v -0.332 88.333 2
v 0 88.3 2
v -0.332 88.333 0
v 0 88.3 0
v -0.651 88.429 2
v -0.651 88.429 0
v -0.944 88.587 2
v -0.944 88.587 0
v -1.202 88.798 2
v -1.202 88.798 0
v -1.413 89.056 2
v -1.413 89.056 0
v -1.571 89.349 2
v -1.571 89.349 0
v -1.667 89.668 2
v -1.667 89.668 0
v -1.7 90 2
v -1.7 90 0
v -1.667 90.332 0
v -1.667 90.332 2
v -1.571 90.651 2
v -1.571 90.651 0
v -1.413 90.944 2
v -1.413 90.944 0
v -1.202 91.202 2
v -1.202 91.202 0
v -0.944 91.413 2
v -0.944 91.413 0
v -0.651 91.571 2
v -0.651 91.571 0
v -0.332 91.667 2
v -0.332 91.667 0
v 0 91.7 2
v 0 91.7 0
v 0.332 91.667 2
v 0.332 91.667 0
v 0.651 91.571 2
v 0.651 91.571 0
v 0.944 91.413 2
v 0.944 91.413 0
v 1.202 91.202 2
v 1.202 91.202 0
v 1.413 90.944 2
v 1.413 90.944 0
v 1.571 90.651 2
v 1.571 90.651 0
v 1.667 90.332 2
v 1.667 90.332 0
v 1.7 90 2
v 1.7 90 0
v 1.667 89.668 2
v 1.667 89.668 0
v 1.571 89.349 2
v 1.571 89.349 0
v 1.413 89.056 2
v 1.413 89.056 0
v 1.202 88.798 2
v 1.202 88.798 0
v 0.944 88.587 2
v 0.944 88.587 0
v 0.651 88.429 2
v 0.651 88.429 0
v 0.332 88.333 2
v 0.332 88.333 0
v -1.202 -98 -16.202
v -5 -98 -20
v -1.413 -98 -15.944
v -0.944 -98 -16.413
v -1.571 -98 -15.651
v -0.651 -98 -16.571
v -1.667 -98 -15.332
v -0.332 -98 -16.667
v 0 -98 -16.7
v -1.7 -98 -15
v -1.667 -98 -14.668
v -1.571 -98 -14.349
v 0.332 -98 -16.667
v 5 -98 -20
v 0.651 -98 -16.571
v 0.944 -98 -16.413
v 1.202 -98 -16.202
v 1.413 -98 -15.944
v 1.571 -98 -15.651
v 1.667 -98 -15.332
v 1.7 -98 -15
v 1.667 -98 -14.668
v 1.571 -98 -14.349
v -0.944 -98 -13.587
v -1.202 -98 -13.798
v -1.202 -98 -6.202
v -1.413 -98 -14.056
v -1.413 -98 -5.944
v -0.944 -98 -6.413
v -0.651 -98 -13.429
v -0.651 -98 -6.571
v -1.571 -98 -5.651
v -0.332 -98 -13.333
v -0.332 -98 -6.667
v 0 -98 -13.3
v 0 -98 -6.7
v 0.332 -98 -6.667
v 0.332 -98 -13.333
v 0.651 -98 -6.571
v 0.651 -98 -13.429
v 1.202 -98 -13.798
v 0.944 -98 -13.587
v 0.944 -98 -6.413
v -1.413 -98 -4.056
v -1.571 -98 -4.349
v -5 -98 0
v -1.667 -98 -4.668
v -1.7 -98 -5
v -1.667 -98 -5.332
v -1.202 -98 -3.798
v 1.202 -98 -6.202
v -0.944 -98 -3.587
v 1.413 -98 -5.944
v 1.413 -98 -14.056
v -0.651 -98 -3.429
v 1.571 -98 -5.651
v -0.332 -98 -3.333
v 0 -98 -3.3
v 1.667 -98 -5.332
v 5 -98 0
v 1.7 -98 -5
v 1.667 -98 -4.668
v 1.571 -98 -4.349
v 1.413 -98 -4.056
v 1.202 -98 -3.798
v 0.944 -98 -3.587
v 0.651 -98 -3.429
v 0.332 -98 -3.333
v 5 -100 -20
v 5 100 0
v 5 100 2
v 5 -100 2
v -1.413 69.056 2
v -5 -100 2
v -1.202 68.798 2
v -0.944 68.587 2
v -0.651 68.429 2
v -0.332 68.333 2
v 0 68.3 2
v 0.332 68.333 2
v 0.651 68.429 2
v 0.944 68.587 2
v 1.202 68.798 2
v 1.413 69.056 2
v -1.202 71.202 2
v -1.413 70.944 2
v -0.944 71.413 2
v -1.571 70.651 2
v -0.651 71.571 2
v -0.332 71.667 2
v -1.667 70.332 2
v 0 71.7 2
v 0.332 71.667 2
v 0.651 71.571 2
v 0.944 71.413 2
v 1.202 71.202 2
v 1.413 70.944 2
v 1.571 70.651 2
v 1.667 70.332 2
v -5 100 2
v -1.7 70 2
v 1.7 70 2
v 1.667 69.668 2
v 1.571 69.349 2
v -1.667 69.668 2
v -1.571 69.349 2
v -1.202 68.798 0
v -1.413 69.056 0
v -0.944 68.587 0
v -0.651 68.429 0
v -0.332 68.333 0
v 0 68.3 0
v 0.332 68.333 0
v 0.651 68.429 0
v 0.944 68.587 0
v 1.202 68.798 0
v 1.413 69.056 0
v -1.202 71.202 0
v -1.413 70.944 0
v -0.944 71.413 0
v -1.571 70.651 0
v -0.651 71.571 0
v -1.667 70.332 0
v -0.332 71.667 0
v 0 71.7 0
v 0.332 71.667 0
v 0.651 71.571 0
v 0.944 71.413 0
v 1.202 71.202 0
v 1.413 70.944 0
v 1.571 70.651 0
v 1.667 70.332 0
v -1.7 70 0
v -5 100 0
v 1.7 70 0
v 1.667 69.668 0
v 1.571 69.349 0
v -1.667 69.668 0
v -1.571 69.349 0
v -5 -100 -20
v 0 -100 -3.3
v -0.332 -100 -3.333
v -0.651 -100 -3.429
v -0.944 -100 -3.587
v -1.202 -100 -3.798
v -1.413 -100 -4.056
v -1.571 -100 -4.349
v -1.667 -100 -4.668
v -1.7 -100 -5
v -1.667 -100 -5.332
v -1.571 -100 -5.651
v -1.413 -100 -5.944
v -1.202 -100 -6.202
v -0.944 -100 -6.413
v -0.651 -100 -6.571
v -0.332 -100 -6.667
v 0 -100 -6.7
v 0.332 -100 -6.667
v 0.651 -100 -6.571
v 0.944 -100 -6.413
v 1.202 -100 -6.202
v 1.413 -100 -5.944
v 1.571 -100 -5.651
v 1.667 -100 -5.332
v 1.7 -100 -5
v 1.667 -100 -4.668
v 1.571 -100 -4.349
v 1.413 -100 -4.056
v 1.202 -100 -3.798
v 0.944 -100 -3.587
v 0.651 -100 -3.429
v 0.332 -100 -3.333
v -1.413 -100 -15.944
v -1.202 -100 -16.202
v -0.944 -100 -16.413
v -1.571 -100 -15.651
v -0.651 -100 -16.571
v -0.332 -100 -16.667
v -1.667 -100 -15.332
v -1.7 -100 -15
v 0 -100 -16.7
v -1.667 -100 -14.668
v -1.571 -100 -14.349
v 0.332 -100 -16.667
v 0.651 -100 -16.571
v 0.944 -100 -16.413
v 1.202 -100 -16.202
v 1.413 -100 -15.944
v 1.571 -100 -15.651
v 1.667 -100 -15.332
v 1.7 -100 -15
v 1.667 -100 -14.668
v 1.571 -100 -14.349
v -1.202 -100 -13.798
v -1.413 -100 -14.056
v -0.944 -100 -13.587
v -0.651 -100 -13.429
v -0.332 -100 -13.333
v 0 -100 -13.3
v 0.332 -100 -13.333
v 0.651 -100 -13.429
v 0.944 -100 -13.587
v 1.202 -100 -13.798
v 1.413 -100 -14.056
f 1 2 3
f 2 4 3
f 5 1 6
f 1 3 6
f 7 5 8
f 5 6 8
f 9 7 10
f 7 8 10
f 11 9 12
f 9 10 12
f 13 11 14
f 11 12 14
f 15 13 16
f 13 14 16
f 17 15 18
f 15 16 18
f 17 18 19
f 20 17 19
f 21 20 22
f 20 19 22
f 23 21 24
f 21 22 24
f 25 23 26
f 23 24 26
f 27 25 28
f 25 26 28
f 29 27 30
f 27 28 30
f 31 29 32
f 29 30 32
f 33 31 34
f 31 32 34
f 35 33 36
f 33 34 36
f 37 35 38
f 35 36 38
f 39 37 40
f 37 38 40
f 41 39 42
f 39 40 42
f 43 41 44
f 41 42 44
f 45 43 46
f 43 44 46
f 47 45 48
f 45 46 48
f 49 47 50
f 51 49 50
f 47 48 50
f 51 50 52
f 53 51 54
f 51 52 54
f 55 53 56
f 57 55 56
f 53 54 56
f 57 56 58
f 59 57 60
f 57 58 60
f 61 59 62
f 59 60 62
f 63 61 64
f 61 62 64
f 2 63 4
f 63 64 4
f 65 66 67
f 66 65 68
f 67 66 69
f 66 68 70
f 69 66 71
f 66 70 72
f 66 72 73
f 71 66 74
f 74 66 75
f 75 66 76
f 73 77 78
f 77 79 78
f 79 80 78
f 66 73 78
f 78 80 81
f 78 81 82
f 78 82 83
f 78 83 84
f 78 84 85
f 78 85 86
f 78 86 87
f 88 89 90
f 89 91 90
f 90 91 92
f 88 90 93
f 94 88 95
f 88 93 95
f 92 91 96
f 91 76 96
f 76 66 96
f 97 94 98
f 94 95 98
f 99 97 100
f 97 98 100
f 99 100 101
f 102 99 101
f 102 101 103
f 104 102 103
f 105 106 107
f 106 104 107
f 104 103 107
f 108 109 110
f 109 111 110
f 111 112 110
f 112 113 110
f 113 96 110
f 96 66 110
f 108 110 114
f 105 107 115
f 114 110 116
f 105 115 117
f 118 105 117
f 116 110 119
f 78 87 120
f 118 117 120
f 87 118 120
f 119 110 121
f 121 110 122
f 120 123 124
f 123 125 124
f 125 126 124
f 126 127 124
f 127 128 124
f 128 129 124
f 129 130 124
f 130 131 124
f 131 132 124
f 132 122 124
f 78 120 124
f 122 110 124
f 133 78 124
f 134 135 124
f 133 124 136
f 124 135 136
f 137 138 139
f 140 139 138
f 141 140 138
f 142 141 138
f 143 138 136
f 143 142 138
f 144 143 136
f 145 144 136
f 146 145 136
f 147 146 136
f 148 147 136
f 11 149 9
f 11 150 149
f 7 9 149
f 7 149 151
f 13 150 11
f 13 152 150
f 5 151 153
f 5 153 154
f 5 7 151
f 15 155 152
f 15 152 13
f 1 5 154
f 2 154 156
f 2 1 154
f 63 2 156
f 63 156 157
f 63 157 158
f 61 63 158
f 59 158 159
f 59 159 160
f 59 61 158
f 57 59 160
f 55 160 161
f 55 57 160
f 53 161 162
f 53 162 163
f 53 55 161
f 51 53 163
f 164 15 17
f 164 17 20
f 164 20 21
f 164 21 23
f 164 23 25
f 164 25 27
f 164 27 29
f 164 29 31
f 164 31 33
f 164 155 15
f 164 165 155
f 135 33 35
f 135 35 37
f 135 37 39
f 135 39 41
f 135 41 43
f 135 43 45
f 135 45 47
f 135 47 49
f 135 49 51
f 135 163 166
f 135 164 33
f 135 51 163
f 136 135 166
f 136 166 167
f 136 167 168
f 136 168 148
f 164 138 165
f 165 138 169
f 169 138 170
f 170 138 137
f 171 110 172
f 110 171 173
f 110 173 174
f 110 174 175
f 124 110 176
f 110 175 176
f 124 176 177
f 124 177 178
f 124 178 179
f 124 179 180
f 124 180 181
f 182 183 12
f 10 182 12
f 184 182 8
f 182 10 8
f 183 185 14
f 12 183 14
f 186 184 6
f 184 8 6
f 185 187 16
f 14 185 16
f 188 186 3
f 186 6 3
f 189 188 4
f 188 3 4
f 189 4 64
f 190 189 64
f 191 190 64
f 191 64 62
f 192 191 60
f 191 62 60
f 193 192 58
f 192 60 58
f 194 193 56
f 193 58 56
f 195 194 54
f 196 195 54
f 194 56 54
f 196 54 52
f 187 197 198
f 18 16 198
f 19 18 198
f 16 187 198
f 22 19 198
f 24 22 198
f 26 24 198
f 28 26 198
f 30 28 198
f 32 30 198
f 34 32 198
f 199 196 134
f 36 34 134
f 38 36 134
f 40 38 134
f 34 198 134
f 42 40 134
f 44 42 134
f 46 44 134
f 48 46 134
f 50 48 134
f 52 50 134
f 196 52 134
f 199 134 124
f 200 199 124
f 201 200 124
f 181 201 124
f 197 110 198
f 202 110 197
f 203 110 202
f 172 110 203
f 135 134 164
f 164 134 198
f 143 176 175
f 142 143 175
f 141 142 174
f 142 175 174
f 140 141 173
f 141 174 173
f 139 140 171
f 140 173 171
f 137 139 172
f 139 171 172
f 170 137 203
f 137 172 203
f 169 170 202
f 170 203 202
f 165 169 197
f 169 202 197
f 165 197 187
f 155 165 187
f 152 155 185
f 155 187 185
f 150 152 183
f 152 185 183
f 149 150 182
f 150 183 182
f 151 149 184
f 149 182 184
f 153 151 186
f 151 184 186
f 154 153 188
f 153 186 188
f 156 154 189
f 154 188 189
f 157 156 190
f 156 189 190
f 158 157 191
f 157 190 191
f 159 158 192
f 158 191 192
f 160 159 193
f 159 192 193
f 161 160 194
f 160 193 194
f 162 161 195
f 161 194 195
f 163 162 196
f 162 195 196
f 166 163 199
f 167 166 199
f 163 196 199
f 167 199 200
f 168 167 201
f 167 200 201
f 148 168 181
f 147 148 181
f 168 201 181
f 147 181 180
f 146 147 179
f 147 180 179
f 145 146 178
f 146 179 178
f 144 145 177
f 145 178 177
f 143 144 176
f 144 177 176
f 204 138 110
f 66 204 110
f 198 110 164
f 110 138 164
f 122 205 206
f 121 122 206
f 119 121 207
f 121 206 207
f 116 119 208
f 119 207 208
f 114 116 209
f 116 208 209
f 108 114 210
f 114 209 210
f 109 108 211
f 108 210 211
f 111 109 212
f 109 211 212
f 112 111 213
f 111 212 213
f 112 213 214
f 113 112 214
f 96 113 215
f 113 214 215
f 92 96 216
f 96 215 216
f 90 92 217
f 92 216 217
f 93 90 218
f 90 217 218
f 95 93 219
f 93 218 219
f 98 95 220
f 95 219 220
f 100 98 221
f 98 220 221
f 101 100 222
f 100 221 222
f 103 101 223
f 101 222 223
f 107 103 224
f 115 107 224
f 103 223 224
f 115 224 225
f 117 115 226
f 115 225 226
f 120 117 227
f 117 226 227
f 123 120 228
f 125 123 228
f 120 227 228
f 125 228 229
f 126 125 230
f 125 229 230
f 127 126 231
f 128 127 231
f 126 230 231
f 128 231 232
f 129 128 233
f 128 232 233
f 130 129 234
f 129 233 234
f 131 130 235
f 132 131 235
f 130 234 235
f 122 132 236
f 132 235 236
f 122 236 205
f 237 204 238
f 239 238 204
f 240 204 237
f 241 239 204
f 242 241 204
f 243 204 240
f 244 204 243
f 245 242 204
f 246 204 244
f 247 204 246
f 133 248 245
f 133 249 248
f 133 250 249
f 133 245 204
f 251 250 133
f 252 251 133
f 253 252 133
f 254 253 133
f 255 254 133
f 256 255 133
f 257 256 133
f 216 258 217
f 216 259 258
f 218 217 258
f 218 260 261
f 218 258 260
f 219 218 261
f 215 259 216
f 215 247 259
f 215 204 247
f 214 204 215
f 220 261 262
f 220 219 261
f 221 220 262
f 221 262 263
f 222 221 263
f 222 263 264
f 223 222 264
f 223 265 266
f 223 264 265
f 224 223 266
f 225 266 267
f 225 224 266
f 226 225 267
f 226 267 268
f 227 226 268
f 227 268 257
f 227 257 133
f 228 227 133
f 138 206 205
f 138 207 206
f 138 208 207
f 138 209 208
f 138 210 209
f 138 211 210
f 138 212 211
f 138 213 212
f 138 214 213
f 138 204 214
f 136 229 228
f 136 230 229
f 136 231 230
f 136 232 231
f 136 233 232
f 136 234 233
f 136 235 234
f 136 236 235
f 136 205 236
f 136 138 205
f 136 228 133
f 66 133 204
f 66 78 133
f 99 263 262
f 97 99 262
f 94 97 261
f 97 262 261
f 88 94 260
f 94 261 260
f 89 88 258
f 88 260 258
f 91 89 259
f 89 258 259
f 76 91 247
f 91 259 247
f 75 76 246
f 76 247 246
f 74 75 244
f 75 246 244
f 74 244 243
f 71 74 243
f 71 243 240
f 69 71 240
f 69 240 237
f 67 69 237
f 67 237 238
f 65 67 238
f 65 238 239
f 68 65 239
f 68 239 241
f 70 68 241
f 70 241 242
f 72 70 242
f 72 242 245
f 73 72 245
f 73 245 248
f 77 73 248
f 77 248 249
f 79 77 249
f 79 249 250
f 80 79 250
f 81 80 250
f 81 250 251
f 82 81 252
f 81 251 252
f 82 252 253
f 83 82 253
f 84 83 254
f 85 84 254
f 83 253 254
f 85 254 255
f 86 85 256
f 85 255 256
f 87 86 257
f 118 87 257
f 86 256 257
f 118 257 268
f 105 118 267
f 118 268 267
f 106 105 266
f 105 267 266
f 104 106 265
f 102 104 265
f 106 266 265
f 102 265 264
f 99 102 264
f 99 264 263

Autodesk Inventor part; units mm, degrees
ref_plane "YZ Plane" through (0, 0, 0) normal (1, 0, 0) x (0, 1, 0)
ref_plane "XZ Plane" through (0, 0, 0) normal (0, 1, 0) x (-1, 0, 0)
ref_plane "XY Plane" through (0, 0, 0) normal (0, 0, 1) x (1, 0, 0)
sketch "スケッチ1" plane through (0, 0, 0) normal (0, 0, 1) x (1, 0, 0)
  line L0 (-5, -100) -> (5, -100)
  line L1 (5, -100) -> (5, 100)
  line L2 (5, 100) -> (-5, 100)
  line L3 (-5, 100) -> (-5, -100)
  line L4 (-5, -100) -> (5, 100) construction
  line L5 (5, -100) -> (-5, 100) construction
  point P0 (0, 0)
  dimension "d0" = 10
  dimension "d1" = 200
extrude "押し出し1" add sketch "スケッチ1" along normal blind 2
sketch "スケッチ2" plane through (0, 0, 2) normal (0, 0, 1) x (1, 0, 0)
  line L0 (5, 100) -> (-5, 100) projected
  point P0 (0, 0)
  point P1 (0, 100)
  point P2 (0, 90)
  point P3 (0, 70)
  dimension "d4" = 10
  dimension "d5" = 20
hole "穴1" at (0, 90, 2) at (0, 70, 2) direction (0, 0, -1) diameter 3.4 end through all clearance for "Flat Head Machine Screw" size "M3" standard "Ansi Metric M Profile"
sketch "スケッチ3" plane through (0, 0, 0) normal (0, 0, -1) x (-1, 0, 0)
  line L0 (5, -100) -> (-5, -100) projected
  line L1 (-5, -100) -> (5, -100)
  line L2 (5, -100) -> (5, -98)
  line L3 (5, -98) -> (-5, -98)
  line L4 (-5, -98) -> (-5, -100)
  point P0 (0, 0)
  dimension "d13" = 2
extrude "押し出し2" add sketch "スケッチ3" along normal blind 20
sketch "スケッチ4" plane through (-5, -98, 0) normal (0, 1, 0) x (1, 0, 0)
  line L0 (0, 20) -> (10, 20) projected
  point P0 (5, 0)
  point P1 (5, 15)
  point P2 (5, 5)
  dimension "d16" = 5
  dimension "d17" = 10
hole "穴2" at (0, -98, -15) at (0, -98, -5) direction (0, -1, 0) diameter 3.4 end through all clearance for "Flat Head Machine Screw" size "M3" standard "Ansi Metric M Profile"
properties part number "20220509_知能ロボットカメラ角棒"
